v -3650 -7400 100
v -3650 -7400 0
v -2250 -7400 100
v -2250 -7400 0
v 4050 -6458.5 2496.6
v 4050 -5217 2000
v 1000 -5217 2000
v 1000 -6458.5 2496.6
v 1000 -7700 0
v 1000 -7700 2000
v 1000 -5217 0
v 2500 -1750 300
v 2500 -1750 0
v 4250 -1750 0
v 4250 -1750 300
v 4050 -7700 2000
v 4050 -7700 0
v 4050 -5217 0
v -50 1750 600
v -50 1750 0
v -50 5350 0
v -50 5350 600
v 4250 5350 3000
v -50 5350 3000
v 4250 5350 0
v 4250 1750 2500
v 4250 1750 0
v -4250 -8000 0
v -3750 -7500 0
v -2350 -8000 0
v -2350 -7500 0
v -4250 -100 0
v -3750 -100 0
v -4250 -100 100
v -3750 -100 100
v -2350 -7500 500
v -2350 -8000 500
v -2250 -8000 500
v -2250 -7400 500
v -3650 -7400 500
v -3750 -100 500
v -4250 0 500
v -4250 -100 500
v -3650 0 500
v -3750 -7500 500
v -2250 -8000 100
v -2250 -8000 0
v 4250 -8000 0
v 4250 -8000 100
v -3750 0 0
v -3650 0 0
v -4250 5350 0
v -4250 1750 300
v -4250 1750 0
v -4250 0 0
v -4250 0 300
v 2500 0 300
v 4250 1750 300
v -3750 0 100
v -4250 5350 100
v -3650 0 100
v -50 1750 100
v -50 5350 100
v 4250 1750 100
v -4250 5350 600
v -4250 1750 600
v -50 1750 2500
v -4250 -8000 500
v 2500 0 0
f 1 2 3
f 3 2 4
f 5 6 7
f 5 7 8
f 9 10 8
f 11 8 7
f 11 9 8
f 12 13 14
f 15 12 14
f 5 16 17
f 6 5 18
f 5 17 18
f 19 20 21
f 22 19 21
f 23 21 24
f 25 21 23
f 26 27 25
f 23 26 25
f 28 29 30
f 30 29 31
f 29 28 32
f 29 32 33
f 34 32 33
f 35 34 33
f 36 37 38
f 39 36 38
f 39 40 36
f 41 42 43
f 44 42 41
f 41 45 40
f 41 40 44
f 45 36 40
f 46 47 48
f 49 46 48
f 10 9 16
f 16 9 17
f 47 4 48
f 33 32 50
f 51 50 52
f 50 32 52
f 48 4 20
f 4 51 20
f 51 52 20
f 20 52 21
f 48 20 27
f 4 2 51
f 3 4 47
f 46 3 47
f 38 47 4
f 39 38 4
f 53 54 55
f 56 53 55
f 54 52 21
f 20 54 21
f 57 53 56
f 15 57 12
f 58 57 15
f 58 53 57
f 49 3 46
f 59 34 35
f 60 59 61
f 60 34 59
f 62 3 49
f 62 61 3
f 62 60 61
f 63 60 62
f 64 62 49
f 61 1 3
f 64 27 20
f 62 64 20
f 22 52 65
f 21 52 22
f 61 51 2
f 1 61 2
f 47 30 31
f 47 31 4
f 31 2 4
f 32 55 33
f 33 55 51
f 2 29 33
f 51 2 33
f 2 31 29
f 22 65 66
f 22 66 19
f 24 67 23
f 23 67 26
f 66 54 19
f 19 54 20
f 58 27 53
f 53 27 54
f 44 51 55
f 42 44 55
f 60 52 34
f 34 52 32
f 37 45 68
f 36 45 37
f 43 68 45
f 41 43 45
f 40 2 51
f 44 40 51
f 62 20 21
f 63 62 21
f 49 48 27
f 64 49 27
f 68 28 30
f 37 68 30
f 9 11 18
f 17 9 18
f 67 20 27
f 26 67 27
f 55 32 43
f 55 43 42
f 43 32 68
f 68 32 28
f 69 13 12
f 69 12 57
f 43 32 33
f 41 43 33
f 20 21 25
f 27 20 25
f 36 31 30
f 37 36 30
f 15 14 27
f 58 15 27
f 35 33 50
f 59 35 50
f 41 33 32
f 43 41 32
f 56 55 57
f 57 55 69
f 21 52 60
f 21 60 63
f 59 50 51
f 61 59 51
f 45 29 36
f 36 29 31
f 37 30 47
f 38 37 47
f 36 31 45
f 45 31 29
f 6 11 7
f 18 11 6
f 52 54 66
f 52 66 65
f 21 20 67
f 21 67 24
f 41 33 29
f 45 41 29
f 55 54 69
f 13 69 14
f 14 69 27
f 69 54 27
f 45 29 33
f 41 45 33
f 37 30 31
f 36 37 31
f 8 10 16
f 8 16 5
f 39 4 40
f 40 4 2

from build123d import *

# Parameters (mm, degrees)
F0_W        = 3050
F0_H        = 2483
F0_W_2      = 500
F0_H_2      = 100
F0_W_3      = 1750
F0_H_3      = 1750
F0_W_4      = 4200
F0_H_4      = 3600
F1_DEPTH    = 100
F2_DEPTH    = 500
F3_DEPTH    = 300
F4_DEPTH    = 600
F5_DEPTH    = 2500
F6_T1_DEPTH = 9532.7840978253
F0_W_5      = 100
F7_DEPTH    = 500
F0_W_6      = 4300
F8_DEPTH    = 3000
F9_SIZE2    = 499.99999
F9_SIZE     = 3599.99999


# Not quite as in the source:
# - a fillet or chamfer that OpenCascade refuses, or shapes differently, is made with other operations: its cross-section is extruded or revolved along the edge and cut away or added
# - a fillet or chamfer is up to 0.001 mm smaller than in the source, because OpenCascade refuses the exact size


with BuildPart() as f1:
    # F0 (on Top) → F1 (new body)
    with BuildSketch(Plane.XY):
        Polygon((2500, -1750), (2500, 0), (-3650, 0), (-3650, -100), (-3650, -7400), (-2250, -7400), (-2250, -8000), (4250, -8000), (4250, -1750), align=None)
        with Locations((2525, -6458.5)):
            Rectangle(F0_W, F0_H, mode=Mode.SUBTRACT)
        with Locations((2525, -6458.5)):
            Rectangle(F0_W, F0_H)
        with Locations((-4000, -50)):
            Rectangle(F0_W_2, F0_H_2)
        with Locations((3375, -875)):
            Rectangle(F0_W_3, F0_H_3)
        Polygon((2500, 0), (4250, 0), (4250, 1750), (-50, 1750), (-4250, 1750), (-4250, 0), (-3750, 0), (-3650, 0), align=None)
        with Locations((-2150, 3550)):
            Rectangle(F0_W_4, F0_H_4)
    extrude(amount=F1_DEPTH)


with BuildPart() as f2:
    # F0 (on Top) → F2 (new body)
    with BuildSketch(Plane.XY):
        Polygon((-3750, -7500), (-3750, -100), (-4250, -100), (-4250, -8000), (-2350, -8000), (-2350, -7500), align=None)
    extrude(amount=F2_DEPTH)


with BuildPart() as f3:
    # F0 (on Top) → F3 (new body)
    with BuildSketch(Plane.XY):
        Polygon((2500, 0), (4250, 0), (4250, 1750), (-50, 1750), (-4250, 1750), (-4250, 0), (-3750, 0), (-3650, 0), align=None)
        with Locations((3375, -875)):
            Rectangle(F0_W_3, F0_H_3)
    extrude(amount=F3_DEPTH)


with BuildPart() as f4:
    # F0 (on Top) → F4 (new body)
    with BuildSketch(Plane.XY):
        with Locations((-2150, 3550)):
            Rectangle(F0_W_4, F0_H_4)
    extrude(amount=F4_DEPTH)


with BuildPart() as f5:
    # F0 (on Top) → F5 (new body)
    with BuildSketch(Plane.XY):
        with Locations((2525, -6458.5)):
            Rectangle(F0_W, F0_H)
    extrude(amount=F5_DEPTH)

    # F6: chamfer of 500 x 1250 on 2 edges, made by hand

    # F6_s2 → F6_t1 (cut)
    with BuildSketch(Plane.YZ.offset(-2241.3920489126)):
        Polygon((-7700, 2000), (-6450, 2500), (-7700, 2500), align=None)
        Polygon((-5217, 2000), (-6467, 2500), (-5217, 2500), align=None)
    extrude(amount=F6_T1_DEPTH, mode=Mode.SUBTRACT)


with BuildPart() as f7:
    # F0 (on Top) → F7 (new body, through all)
    with BuildSketch(Plane.XY):
        with Locations((-3700, -50)):
            Rectangle(F0_W_5, F0_H_2)
        Polygon((-3650, -7400), (-3650, -100), (-3750, -100), (-3750, -7500), (-2350, -7500), (-2350, -8000), (-2250, -8000), (-2250, -7400), align=None)
        with Locations((-4000, -50)):
            Rectangle(F0_W_2, F0_H_2)
    extrude(amount=F7_DEPTH)


with BuildPart() as f8:
    # F0 (on Top) → F8 (new body)
    with BuildSketch(Plane.XY):
        with Locations((2100, 3550)):
            Rectangle(F0_W_6, F0_H_4)
    extrude(amount=F8_DEPTH)

    # F9 (size 3600 and 500 in the source; OpenCascade refuses exactly that, so slightly less here)
    f9_edges = [f8.edges().sort_by_distance(p)[0] for p in [
        (2100, 1750, 3000),
    ]]
    f9_side = f8.faces().sort_by_distance((2100, 3550, 3000))[0]
    chamfer(f9_edges, length=F9_SIZE, length2=F9_SIZE2, reference=f9_side)


solid = Compound([f1.part, f2.part, f3.part, f4.part, f5.part, f7.part, f8.part])
